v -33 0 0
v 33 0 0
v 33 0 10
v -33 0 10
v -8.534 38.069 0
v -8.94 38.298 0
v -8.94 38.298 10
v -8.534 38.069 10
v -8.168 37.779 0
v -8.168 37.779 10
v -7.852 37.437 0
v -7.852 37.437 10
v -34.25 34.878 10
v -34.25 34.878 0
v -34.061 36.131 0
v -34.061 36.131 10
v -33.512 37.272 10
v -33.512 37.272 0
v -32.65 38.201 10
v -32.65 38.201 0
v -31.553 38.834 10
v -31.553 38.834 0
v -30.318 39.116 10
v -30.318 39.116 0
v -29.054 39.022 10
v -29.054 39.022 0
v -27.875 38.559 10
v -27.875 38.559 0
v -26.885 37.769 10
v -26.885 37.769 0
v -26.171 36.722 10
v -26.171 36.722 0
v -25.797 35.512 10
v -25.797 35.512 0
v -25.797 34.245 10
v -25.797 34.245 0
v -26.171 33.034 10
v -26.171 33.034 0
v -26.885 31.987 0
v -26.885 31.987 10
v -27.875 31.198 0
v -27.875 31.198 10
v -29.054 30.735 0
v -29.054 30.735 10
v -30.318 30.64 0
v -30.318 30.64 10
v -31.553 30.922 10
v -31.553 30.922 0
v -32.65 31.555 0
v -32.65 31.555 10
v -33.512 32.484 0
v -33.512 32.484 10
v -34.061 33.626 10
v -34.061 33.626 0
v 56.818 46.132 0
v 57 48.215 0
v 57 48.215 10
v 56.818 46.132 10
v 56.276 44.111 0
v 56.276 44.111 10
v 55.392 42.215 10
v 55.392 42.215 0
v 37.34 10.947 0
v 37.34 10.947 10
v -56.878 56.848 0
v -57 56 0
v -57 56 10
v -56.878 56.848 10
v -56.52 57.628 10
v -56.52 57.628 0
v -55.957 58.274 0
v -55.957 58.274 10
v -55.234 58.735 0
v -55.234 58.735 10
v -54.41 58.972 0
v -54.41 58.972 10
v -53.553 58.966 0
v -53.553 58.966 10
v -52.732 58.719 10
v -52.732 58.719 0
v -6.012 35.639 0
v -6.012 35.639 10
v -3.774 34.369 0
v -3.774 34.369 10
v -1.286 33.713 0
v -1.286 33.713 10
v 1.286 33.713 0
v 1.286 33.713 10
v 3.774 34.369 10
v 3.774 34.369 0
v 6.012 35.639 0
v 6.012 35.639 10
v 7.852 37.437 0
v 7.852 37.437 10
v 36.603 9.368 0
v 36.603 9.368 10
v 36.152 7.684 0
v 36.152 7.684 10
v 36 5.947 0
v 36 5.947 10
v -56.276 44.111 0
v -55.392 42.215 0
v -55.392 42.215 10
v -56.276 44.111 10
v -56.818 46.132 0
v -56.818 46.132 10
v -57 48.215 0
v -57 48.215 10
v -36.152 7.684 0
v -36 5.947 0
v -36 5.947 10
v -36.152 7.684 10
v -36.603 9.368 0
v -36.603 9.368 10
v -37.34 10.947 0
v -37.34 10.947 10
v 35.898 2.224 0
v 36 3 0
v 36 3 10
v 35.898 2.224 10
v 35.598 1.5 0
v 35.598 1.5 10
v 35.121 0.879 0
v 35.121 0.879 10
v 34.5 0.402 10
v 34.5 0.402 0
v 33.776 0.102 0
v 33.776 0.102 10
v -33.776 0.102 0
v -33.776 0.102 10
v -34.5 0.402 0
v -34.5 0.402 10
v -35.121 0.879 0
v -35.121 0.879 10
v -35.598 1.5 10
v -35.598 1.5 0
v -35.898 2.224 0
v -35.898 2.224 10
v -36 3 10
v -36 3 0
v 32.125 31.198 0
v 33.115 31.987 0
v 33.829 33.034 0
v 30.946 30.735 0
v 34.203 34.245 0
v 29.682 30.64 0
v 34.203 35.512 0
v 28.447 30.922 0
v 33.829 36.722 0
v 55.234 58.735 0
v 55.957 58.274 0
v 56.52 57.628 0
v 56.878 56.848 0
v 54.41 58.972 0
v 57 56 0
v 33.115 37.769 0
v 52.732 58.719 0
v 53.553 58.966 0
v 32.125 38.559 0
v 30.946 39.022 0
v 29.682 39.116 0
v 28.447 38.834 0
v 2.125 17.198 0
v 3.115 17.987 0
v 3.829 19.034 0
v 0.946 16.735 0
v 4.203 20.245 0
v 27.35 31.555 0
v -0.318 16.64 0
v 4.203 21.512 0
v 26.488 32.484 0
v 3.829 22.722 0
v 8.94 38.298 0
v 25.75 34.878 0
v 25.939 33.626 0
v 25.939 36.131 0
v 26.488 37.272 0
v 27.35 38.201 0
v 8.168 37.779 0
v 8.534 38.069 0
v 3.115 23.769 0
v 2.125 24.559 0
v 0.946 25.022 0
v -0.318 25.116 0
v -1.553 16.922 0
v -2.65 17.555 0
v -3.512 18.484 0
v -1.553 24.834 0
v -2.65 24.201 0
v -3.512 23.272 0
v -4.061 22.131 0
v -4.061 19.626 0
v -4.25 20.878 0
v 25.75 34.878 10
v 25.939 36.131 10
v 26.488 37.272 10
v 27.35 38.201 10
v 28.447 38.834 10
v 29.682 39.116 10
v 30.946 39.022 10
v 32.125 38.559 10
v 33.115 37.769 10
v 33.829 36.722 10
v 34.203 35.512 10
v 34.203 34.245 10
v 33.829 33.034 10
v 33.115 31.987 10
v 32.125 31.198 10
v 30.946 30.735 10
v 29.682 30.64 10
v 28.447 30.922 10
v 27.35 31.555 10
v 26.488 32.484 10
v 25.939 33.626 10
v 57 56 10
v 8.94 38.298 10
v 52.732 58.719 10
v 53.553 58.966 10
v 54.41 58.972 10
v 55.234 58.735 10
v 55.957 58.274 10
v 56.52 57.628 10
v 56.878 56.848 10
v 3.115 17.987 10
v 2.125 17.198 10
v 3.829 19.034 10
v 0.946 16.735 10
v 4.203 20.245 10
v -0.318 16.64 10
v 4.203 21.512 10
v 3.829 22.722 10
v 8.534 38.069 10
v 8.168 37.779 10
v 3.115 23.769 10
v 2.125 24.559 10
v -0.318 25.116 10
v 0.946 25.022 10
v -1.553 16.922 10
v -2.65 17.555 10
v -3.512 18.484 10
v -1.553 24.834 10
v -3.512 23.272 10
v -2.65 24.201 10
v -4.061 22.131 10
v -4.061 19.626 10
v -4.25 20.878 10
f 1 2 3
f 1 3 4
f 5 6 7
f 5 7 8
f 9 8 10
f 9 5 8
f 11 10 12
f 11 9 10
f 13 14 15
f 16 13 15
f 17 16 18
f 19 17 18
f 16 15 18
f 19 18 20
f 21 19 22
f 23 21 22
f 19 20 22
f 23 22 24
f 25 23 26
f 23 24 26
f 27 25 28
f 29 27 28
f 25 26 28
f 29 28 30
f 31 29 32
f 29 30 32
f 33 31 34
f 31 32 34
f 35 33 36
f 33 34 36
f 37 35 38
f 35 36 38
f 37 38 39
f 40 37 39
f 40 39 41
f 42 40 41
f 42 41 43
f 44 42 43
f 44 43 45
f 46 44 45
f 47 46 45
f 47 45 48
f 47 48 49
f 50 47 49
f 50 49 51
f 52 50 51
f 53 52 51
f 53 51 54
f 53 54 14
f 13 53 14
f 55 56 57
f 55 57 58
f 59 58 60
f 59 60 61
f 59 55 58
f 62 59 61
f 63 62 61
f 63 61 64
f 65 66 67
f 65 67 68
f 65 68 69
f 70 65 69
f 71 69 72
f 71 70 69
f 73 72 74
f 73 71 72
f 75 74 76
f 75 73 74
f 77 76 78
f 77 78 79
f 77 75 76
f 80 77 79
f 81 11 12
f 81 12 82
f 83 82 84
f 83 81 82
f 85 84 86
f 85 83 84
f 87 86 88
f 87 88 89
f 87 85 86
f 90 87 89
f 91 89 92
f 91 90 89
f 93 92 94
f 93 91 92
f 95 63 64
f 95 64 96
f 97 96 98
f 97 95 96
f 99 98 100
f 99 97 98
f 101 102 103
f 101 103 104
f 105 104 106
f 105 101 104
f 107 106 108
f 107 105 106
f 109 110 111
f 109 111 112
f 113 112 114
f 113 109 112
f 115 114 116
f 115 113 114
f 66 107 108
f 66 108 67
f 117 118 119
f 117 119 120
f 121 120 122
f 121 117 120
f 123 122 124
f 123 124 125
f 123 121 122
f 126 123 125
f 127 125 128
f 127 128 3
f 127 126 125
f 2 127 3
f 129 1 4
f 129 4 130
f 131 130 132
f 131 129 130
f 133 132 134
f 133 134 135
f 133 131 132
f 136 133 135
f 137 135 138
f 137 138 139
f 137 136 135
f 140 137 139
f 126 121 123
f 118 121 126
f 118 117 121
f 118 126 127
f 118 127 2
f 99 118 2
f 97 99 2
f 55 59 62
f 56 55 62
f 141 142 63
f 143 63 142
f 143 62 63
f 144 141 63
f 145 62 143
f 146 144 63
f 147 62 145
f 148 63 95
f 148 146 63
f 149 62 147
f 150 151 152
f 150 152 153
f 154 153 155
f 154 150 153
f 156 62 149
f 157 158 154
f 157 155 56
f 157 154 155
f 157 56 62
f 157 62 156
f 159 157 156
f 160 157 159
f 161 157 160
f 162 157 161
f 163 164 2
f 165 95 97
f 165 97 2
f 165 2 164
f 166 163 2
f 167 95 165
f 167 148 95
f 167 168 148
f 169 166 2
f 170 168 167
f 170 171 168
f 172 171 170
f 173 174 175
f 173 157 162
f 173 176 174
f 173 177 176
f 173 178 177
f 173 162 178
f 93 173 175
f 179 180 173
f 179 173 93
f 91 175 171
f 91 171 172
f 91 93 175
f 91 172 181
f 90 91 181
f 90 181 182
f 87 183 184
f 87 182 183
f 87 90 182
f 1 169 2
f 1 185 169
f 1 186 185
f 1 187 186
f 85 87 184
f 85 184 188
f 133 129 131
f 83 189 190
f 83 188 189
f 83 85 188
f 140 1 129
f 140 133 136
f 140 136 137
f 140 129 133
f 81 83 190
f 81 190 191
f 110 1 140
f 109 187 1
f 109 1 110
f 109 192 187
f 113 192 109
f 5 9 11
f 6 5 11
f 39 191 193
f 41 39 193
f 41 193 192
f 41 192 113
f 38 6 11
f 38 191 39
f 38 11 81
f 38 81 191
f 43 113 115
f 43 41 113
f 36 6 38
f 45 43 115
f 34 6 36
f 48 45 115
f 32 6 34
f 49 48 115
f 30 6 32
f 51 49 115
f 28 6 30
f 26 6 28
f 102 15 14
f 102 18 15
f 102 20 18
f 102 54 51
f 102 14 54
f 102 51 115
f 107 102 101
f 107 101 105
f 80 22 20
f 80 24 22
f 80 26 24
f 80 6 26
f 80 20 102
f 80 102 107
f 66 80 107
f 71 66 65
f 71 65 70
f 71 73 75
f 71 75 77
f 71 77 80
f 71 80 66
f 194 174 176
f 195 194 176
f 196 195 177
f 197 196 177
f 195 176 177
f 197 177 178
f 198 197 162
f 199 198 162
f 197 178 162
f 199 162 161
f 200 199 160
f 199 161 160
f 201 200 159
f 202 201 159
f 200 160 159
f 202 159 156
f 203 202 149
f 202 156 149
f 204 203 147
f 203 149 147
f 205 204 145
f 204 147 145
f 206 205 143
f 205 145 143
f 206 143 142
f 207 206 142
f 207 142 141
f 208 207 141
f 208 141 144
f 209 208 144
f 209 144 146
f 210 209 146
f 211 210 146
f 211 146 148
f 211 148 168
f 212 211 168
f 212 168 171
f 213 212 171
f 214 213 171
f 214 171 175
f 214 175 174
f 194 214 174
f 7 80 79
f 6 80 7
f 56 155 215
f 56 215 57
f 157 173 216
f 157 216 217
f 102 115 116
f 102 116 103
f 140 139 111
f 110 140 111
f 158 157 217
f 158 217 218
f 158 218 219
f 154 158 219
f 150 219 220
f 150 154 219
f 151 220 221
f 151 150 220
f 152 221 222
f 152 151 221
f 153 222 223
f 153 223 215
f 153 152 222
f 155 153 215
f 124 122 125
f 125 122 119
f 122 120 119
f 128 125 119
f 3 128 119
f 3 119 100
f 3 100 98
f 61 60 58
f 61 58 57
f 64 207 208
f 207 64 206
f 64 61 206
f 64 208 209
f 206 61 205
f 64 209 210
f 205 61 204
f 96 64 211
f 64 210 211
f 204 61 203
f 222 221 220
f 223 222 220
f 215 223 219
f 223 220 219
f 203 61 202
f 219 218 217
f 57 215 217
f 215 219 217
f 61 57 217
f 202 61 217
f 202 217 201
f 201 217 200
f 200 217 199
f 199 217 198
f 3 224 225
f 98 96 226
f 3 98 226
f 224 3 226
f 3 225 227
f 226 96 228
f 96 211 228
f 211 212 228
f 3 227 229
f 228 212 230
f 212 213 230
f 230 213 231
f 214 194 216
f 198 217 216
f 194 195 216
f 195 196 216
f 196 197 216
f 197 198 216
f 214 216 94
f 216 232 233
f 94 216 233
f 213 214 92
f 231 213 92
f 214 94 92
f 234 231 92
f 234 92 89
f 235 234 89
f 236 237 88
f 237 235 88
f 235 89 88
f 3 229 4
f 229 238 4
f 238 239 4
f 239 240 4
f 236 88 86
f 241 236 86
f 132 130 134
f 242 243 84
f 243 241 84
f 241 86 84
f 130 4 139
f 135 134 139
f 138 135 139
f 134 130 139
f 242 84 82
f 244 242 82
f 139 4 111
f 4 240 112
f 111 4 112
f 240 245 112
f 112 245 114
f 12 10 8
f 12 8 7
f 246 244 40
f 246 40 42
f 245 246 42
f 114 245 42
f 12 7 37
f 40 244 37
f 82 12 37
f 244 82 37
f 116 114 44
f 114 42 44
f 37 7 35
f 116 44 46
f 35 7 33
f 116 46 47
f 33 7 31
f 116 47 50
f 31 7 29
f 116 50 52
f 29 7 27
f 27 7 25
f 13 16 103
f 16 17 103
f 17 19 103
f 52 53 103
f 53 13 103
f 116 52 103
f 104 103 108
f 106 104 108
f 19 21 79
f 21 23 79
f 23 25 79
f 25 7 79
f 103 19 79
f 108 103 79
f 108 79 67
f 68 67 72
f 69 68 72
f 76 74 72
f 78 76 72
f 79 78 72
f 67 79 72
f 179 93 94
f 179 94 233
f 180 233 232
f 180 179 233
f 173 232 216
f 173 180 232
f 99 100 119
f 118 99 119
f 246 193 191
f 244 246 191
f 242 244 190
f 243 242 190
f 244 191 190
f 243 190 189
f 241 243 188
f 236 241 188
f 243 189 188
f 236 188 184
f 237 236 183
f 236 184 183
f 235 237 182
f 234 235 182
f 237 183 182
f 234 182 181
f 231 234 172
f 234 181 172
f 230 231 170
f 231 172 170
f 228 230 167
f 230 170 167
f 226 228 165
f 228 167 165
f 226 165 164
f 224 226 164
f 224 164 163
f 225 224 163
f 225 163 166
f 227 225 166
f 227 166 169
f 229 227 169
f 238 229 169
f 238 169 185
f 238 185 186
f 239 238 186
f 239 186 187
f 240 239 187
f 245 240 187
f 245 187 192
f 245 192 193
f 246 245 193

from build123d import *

# Parameters (mm, degrees)
EXTRUDE1_DEPTH         = 10
M10_GEVINDHULLER_D     = 8.5
M10_GEVINDHULLER_DEPTH = 22
M10_GEVINDHULLER_TIP   = 2.553657631


with BuildPart() as part:
    # Sketch1 → Extrude1 (new body)
    with BuildSketch(Plane.XY):
        with BuildLine():
            Line((-37.339745962, 10.947441117), (-55.392304845, 42.215390309))
            ThreePointArc((-55.392304845, 42.215390309), (-56.591109915, 45.109561768), (-57, 48.215390309))
            Line((-57, 48.215390309), (-57, 56))
            ThreePointArc((-57, 56), (-55.611898825, 58.530174337), (-52.732145215, 58.718923361))
            Line((-52.732145215, 58.718923361), (-8.939617358, 38.298132251))
            ThreePointArc((-8.939617358, 38.298132251), (-8.345295598, 37.931292757), (-7.851901649, 37.436973043))
            ThreePointArc((-7.851901649, 37.436973043), (0, 33.629520217), (7.851901649, 37.436973043))
            ThreePointArc((7.851901649, 37.436973043), (8.345295598, 37.931292757), (8.939617358, 38.298132251))
            Line((8.939617358, 38.298132251), (52.732145215, 58.718923361))
            ThreePointArc((52.732145215, 58.718923361), (55.611898825, 58.530174337), (57, 56))
            Line((57, 56), (57, 48.215390309))
            ThreePointArc((57, 48.215390309), (56.591109915, 45.109561768), (55.392304845, 42.215390309))
            Line((55.392304845, 42.215390309), (37.339745962, 10.947441117))
            ThreePointArc((37.339745962, 10.947441117), (36.340741737, 8.535631568), (36, 5.947441117))
            Line((36, 5.947441117), (36, 3))
            ThreePointArc((36, 3), (35.121320344, 0.878679656), (33, 0))
            Line((33, 0), (0, 0))
            Line((0, 0), (-33, 0))
            ThreePointArc((-33, 0), (-35.121320344, 0.878679656), (-36, 3))
            Line((-36, 3), (-36, 5.947441117))
            ThreePointArc((-36, 5.947441117), (-36.340741737, 8.535631568), (-37.339745962, 10.947441117))
        make_face()
    extrude(amount=EXTRUDE1_DEPTH)

    # M10 gevindhuller
    with Locations(Plane.XY.offset(10)):
        with Locations((-30, 34.878214934), (30, 34.878214934), (0, 20.878214934)):
            Hole(M10_GEVINDHULLER_D / 2, depth=M10_GEVINDHULLER_DEPTH)
            with Locations((0, 0, -(M10_GEVINDHULLER_DEPTH + M10_GEVINDHULLER_TIP / 2))):  # 118° drill point
                Cone(0, M10_GEVINDHULLER_D / 2, M10_GEVINDHULLER_TIP, mode=Mode.SUBTRACT)


solid = part.part
